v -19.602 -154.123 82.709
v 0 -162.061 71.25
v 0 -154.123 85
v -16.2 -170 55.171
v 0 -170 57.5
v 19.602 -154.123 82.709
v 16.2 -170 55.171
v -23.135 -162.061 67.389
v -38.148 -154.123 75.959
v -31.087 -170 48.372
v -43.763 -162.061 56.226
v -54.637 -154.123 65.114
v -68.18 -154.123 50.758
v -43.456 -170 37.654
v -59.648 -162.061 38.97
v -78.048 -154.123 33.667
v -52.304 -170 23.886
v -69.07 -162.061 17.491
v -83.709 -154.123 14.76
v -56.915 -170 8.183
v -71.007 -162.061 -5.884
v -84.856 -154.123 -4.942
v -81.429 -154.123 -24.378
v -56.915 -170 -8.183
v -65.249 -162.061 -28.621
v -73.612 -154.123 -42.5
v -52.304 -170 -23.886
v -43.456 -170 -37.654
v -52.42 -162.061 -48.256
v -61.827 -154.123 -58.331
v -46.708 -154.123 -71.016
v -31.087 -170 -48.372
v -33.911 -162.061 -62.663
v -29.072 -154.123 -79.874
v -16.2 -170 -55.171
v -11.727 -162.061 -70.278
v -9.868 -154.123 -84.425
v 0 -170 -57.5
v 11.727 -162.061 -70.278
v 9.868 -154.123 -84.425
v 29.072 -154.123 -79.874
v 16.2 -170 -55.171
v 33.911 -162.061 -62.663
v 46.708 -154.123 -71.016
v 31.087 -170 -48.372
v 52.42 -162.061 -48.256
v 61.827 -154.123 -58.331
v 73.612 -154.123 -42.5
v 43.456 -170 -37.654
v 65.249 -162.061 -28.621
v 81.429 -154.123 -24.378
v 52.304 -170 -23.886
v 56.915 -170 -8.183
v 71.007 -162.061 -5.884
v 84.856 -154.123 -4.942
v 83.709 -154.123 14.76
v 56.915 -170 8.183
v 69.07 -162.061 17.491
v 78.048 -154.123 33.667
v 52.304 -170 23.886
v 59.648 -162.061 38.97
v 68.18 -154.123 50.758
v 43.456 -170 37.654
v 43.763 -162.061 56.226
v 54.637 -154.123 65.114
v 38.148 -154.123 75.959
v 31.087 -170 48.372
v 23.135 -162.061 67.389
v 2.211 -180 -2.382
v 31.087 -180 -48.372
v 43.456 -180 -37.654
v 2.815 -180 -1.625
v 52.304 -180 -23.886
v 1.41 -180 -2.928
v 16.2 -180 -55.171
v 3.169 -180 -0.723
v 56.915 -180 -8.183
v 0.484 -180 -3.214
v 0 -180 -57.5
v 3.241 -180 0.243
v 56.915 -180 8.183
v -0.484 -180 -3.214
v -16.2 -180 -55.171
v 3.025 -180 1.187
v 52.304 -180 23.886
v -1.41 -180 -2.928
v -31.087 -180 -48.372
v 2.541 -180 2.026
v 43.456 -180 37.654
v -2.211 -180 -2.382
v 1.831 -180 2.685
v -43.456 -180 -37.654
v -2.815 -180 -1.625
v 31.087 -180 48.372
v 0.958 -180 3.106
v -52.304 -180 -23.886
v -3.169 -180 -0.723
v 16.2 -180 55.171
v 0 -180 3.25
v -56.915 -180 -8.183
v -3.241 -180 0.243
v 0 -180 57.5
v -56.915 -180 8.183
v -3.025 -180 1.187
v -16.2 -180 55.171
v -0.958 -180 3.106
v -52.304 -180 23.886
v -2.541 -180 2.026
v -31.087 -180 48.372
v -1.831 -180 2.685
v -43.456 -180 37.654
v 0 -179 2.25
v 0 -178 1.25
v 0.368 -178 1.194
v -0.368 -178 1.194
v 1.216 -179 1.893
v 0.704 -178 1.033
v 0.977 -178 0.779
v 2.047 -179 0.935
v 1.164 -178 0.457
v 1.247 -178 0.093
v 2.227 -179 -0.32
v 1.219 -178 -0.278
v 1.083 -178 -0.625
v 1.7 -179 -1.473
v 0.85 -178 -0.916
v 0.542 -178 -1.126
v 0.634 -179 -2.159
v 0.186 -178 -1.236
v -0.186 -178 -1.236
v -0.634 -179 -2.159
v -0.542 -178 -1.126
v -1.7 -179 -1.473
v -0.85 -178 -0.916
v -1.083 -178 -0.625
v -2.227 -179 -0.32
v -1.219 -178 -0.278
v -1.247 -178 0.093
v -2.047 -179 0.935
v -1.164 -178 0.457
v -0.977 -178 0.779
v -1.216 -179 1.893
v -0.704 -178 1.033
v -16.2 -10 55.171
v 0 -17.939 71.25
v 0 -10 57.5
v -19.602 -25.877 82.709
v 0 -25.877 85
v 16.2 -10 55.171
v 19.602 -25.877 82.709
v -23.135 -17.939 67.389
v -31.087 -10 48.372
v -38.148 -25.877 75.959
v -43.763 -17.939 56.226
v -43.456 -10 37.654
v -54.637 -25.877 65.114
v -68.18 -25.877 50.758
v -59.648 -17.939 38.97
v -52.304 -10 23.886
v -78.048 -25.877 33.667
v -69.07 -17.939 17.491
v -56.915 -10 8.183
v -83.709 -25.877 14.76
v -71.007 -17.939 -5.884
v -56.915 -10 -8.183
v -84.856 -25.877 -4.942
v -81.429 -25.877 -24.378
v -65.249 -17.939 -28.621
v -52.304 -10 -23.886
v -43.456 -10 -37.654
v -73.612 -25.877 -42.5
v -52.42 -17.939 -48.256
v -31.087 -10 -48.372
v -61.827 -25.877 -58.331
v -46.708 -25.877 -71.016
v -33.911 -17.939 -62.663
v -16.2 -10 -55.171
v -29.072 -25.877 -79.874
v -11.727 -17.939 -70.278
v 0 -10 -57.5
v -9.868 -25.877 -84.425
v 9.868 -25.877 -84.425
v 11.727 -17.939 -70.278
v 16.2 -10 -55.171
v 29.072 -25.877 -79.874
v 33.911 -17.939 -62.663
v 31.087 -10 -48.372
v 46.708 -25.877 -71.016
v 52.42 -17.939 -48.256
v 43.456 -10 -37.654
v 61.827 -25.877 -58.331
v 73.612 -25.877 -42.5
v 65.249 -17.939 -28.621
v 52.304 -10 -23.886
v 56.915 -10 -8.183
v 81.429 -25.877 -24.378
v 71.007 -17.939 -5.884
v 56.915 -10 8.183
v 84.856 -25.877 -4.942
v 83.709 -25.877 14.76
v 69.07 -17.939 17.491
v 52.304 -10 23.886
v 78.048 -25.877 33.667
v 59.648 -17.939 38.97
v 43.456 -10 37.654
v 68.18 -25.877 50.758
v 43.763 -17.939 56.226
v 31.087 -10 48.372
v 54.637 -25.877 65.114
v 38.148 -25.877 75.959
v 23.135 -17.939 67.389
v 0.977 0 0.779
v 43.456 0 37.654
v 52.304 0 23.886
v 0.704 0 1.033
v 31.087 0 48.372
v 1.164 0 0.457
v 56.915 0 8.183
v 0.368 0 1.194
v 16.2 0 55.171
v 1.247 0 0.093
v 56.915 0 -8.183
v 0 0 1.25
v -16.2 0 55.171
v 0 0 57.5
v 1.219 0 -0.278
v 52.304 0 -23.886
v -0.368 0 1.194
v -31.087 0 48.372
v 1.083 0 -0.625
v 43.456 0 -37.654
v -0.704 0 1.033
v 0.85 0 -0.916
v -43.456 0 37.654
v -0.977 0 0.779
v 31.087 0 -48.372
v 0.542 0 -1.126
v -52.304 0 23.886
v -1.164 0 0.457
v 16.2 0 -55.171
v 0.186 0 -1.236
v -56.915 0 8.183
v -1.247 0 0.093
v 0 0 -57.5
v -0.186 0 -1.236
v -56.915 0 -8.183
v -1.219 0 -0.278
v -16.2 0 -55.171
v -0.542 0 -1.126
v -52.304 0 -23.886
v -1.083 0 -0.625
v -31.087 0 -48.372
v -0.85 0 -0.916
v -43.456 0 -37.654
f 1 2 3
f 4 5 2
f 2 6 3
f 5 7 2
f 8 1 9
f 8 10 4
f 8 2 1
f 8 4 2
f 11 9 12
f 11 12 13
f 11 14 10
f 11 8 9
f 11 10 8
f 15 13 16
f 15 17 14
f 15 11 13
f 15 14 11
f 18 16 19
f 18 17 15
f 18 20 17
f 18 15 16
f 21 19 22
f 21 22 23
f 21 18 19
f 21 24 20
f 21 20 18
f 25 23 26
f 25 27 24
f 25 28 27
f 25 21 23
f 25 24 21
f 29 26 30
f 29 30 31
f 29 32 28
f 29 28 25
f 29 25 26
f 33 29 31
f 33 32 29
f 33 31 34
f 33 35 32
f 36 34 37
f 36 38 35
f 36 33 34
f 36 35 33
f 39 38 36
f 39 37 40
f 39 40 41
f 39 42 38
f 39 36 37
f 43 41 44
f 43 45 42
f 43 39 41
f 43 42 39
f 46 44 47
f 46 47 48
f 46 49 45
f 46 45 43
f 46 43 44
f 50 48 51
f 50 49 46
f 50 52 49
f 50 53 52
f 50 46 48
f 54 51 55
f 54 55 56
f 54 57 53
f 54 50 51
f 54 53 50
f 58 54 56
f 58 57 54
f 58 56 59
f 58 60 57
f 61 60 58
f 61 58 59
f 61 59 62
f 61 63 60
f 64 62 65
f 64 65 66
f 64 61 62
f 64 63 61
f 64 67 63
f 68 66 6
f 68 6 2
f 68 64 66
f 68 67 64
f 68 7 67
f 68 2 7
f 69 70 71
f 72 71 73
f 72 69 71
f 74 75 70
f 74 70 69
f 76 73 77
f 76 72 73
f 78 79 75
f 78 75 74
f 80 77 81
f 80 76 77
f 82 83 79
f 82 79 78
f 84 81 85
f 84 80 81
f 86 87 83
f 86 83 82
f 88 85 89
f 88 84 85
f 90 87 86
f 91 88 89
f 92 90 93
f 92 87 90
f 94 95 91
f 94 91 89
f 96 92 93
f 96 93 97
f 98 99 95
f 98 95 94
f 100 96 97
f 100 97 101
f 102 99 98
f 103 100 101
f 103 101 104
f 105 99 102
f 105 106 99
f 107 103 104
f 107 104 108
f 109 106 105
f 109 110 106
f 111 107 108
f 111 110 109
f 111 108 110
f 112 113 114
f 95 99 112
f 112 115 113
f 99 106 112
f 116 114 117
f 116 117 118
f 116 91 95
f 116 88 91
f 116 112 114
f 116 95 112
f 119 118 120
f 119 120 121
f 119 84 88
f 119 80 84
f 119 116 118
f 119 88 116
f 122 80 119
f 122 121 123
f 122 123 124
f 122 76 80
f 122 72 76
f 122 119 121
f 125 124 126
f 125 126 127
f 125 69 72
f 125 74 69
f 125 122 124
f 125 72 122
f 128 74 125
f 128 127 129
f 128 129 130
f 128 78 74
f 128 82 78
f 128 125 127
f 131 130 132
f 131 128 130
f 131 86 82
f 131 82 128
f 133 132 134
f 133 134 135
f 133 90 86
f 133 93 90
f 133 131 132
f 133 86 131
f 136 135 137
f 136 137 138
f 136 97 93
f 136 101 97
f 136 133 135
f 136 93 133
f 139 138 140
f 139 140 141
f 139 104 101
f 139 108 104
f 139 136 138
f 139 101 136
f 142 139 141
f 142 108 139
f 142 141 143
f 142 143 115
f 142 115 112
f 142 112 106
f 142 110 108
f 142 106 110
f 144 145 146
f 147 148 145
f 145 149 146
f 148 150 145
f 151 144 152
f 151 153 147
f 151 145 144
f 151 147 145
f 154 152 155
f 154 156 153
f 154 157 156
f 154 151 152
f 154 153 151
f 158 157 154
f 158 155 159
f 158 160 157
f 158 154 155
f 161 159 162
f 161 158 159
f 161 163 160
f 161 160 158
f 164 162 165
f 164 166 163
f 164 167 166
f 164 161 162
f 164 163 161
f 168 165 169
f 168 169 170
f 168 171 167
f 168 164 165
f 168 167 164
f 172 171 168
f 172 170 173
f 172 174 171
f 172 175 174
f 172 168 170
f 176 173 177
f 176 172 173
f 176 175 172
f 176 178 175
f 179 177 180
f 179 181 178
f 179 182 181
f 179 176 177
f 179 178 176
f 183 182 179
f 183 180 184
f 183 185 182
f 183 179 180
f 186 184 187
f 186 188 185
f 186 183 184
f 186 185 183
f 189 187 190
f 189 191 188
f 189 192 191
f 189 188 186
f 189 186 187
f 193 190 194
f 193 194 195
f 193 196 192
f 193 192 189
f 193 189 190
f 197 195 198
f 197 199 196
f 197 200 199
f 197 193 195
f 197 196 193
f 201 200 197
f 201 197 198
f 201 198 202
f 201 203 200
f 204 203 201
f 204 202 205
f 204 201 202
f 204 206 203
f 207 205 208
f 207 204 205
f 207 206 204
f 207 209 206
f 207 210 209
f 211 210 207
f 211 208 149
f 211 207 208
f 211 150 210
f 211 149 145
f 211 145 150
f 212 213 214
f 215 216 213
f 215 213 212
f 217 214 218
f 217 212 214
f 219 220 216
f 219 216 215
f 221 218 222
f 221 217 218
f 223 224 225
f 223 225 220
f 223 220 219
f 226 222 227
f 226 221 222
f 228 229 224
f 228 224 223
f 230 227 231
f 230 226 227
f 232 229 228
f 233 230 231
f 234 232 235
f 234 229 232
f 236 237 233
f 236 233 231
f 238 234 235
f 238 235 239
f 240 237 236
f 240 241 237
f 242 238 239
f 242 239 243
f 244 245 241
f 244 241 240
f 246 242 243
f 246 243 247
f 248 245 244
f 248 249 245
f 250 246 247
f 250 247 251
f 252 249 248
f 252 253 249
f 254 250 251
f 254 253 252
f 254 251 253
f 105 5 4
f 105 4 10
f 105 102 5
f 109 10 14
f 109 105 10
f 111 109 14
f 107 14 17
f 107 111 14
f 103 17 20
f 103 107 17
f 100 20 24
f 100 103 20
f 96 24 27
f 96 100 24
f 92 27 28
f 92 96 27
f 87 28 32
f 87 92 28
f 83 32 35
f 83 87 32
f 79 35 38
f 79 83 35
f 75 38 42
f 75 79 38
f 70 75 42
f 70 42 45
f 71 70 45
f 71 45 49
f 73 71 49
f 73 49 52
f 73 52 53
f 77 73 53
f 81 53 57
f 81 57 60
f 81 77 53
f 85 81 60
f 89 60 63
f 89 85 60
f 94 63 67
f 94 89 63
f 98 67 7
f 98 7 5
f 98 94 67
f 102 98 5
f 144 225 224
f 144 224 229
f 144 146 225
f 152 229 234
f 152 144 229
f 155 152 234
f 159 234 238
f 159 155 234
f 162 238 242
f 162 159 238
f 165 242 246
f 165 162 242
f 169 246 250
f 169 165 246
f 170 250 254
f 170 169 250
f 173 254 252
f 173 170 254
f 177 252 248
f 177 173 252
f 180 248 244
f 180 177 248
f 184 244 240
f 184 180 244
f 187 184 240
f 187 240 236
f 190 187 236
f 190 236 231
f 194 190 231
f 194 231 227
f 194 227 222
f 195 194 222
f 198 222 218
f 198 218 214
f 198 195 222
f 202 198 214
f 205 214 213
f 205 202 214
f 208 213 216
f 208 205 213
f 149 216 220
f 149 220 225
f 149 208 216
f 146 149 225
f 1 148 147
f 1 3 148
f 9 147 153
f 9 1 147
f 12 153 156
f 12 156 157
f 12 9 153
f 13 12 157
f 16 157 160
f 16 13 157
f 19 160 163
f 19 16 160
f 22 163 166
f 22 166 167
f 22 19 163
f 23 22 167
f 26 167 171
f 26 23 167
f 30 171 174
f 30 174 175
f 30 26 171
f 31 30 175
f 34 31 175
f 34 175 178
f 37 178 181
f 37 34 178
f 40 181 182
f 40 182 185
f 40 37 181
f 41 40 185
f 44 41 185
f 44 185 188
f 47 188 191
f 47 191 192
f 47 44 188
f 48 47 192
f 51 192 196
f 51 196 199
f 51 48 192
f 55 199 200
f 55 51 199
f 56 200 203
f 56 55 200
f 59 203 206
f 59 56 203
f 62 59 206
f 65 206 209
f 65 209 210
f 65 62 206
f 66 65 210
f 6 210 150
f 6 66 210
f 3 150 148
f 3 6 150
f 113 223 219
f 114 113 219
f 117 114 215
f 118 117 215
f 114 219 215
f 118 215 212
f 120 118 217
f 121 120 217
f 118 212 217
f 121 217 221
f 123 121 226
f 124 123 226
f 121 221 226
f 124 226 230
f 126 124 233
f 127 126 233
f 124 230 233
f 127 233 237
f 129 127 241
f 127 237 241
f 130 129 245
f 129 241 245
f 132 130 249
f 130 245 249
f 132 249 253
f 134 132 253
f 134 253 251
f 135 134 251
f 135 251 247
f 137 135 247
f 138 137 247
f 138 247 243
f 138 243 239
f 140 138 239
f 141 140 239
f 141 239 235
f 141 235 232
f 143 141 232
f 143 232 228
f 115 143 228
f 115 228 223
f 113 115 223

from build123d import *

# Parameters (mm, degrees)
SKETCH2_R          = 1.25
CUT_EXTRUDE1_DEPTH = 217.448608219
CHAMFER1_SIZE      = 2


with BuildPart() as part:
    # Sketch1 → Revolve1 (revolve)
    with BuildSketch(Plane.XY, mode=Mode.PRIVATE) as revolve1_sk:
        Polygon((0, 0), (-57.5, 0), (-57.5, -10), (-85, -25.877132403), (-85, -154.122867597), (-57.5, -170), (-57.5, -180), (0, -180), align=None)
    revolve(revolve1_sk.sketch.rotate(Axis((0, 52.509012346, 0), (0, -1, 0)), 270), axis=Axis((0, 52.509012346, 0), (0, -1, 0)))

    # Sketch2 → Cut-Extrude1 (cut, through all)
    with BuildSketch(Plane(origin=(0, 0, 0), x_dir=(1, 0, 0), z_dir=(0, 1, 0))):
        with Locations(Location((0, 0, 0), (0, 0, 270))):
            Circle(SKETCH2_R)
    extrude(amount=-CUT_EXTRUDE1_DEPTH, mode=Mode.SUBTRACT)

    # Chamfer1
    chamfer1_edges = [part.edges().sort_by_distance(p)[0] for p in [
        (0, -180, -1.25),
    ]]
    chamfer(chamfer1_edges, length=CHAMFER1_SIZE)


solid = part.part
